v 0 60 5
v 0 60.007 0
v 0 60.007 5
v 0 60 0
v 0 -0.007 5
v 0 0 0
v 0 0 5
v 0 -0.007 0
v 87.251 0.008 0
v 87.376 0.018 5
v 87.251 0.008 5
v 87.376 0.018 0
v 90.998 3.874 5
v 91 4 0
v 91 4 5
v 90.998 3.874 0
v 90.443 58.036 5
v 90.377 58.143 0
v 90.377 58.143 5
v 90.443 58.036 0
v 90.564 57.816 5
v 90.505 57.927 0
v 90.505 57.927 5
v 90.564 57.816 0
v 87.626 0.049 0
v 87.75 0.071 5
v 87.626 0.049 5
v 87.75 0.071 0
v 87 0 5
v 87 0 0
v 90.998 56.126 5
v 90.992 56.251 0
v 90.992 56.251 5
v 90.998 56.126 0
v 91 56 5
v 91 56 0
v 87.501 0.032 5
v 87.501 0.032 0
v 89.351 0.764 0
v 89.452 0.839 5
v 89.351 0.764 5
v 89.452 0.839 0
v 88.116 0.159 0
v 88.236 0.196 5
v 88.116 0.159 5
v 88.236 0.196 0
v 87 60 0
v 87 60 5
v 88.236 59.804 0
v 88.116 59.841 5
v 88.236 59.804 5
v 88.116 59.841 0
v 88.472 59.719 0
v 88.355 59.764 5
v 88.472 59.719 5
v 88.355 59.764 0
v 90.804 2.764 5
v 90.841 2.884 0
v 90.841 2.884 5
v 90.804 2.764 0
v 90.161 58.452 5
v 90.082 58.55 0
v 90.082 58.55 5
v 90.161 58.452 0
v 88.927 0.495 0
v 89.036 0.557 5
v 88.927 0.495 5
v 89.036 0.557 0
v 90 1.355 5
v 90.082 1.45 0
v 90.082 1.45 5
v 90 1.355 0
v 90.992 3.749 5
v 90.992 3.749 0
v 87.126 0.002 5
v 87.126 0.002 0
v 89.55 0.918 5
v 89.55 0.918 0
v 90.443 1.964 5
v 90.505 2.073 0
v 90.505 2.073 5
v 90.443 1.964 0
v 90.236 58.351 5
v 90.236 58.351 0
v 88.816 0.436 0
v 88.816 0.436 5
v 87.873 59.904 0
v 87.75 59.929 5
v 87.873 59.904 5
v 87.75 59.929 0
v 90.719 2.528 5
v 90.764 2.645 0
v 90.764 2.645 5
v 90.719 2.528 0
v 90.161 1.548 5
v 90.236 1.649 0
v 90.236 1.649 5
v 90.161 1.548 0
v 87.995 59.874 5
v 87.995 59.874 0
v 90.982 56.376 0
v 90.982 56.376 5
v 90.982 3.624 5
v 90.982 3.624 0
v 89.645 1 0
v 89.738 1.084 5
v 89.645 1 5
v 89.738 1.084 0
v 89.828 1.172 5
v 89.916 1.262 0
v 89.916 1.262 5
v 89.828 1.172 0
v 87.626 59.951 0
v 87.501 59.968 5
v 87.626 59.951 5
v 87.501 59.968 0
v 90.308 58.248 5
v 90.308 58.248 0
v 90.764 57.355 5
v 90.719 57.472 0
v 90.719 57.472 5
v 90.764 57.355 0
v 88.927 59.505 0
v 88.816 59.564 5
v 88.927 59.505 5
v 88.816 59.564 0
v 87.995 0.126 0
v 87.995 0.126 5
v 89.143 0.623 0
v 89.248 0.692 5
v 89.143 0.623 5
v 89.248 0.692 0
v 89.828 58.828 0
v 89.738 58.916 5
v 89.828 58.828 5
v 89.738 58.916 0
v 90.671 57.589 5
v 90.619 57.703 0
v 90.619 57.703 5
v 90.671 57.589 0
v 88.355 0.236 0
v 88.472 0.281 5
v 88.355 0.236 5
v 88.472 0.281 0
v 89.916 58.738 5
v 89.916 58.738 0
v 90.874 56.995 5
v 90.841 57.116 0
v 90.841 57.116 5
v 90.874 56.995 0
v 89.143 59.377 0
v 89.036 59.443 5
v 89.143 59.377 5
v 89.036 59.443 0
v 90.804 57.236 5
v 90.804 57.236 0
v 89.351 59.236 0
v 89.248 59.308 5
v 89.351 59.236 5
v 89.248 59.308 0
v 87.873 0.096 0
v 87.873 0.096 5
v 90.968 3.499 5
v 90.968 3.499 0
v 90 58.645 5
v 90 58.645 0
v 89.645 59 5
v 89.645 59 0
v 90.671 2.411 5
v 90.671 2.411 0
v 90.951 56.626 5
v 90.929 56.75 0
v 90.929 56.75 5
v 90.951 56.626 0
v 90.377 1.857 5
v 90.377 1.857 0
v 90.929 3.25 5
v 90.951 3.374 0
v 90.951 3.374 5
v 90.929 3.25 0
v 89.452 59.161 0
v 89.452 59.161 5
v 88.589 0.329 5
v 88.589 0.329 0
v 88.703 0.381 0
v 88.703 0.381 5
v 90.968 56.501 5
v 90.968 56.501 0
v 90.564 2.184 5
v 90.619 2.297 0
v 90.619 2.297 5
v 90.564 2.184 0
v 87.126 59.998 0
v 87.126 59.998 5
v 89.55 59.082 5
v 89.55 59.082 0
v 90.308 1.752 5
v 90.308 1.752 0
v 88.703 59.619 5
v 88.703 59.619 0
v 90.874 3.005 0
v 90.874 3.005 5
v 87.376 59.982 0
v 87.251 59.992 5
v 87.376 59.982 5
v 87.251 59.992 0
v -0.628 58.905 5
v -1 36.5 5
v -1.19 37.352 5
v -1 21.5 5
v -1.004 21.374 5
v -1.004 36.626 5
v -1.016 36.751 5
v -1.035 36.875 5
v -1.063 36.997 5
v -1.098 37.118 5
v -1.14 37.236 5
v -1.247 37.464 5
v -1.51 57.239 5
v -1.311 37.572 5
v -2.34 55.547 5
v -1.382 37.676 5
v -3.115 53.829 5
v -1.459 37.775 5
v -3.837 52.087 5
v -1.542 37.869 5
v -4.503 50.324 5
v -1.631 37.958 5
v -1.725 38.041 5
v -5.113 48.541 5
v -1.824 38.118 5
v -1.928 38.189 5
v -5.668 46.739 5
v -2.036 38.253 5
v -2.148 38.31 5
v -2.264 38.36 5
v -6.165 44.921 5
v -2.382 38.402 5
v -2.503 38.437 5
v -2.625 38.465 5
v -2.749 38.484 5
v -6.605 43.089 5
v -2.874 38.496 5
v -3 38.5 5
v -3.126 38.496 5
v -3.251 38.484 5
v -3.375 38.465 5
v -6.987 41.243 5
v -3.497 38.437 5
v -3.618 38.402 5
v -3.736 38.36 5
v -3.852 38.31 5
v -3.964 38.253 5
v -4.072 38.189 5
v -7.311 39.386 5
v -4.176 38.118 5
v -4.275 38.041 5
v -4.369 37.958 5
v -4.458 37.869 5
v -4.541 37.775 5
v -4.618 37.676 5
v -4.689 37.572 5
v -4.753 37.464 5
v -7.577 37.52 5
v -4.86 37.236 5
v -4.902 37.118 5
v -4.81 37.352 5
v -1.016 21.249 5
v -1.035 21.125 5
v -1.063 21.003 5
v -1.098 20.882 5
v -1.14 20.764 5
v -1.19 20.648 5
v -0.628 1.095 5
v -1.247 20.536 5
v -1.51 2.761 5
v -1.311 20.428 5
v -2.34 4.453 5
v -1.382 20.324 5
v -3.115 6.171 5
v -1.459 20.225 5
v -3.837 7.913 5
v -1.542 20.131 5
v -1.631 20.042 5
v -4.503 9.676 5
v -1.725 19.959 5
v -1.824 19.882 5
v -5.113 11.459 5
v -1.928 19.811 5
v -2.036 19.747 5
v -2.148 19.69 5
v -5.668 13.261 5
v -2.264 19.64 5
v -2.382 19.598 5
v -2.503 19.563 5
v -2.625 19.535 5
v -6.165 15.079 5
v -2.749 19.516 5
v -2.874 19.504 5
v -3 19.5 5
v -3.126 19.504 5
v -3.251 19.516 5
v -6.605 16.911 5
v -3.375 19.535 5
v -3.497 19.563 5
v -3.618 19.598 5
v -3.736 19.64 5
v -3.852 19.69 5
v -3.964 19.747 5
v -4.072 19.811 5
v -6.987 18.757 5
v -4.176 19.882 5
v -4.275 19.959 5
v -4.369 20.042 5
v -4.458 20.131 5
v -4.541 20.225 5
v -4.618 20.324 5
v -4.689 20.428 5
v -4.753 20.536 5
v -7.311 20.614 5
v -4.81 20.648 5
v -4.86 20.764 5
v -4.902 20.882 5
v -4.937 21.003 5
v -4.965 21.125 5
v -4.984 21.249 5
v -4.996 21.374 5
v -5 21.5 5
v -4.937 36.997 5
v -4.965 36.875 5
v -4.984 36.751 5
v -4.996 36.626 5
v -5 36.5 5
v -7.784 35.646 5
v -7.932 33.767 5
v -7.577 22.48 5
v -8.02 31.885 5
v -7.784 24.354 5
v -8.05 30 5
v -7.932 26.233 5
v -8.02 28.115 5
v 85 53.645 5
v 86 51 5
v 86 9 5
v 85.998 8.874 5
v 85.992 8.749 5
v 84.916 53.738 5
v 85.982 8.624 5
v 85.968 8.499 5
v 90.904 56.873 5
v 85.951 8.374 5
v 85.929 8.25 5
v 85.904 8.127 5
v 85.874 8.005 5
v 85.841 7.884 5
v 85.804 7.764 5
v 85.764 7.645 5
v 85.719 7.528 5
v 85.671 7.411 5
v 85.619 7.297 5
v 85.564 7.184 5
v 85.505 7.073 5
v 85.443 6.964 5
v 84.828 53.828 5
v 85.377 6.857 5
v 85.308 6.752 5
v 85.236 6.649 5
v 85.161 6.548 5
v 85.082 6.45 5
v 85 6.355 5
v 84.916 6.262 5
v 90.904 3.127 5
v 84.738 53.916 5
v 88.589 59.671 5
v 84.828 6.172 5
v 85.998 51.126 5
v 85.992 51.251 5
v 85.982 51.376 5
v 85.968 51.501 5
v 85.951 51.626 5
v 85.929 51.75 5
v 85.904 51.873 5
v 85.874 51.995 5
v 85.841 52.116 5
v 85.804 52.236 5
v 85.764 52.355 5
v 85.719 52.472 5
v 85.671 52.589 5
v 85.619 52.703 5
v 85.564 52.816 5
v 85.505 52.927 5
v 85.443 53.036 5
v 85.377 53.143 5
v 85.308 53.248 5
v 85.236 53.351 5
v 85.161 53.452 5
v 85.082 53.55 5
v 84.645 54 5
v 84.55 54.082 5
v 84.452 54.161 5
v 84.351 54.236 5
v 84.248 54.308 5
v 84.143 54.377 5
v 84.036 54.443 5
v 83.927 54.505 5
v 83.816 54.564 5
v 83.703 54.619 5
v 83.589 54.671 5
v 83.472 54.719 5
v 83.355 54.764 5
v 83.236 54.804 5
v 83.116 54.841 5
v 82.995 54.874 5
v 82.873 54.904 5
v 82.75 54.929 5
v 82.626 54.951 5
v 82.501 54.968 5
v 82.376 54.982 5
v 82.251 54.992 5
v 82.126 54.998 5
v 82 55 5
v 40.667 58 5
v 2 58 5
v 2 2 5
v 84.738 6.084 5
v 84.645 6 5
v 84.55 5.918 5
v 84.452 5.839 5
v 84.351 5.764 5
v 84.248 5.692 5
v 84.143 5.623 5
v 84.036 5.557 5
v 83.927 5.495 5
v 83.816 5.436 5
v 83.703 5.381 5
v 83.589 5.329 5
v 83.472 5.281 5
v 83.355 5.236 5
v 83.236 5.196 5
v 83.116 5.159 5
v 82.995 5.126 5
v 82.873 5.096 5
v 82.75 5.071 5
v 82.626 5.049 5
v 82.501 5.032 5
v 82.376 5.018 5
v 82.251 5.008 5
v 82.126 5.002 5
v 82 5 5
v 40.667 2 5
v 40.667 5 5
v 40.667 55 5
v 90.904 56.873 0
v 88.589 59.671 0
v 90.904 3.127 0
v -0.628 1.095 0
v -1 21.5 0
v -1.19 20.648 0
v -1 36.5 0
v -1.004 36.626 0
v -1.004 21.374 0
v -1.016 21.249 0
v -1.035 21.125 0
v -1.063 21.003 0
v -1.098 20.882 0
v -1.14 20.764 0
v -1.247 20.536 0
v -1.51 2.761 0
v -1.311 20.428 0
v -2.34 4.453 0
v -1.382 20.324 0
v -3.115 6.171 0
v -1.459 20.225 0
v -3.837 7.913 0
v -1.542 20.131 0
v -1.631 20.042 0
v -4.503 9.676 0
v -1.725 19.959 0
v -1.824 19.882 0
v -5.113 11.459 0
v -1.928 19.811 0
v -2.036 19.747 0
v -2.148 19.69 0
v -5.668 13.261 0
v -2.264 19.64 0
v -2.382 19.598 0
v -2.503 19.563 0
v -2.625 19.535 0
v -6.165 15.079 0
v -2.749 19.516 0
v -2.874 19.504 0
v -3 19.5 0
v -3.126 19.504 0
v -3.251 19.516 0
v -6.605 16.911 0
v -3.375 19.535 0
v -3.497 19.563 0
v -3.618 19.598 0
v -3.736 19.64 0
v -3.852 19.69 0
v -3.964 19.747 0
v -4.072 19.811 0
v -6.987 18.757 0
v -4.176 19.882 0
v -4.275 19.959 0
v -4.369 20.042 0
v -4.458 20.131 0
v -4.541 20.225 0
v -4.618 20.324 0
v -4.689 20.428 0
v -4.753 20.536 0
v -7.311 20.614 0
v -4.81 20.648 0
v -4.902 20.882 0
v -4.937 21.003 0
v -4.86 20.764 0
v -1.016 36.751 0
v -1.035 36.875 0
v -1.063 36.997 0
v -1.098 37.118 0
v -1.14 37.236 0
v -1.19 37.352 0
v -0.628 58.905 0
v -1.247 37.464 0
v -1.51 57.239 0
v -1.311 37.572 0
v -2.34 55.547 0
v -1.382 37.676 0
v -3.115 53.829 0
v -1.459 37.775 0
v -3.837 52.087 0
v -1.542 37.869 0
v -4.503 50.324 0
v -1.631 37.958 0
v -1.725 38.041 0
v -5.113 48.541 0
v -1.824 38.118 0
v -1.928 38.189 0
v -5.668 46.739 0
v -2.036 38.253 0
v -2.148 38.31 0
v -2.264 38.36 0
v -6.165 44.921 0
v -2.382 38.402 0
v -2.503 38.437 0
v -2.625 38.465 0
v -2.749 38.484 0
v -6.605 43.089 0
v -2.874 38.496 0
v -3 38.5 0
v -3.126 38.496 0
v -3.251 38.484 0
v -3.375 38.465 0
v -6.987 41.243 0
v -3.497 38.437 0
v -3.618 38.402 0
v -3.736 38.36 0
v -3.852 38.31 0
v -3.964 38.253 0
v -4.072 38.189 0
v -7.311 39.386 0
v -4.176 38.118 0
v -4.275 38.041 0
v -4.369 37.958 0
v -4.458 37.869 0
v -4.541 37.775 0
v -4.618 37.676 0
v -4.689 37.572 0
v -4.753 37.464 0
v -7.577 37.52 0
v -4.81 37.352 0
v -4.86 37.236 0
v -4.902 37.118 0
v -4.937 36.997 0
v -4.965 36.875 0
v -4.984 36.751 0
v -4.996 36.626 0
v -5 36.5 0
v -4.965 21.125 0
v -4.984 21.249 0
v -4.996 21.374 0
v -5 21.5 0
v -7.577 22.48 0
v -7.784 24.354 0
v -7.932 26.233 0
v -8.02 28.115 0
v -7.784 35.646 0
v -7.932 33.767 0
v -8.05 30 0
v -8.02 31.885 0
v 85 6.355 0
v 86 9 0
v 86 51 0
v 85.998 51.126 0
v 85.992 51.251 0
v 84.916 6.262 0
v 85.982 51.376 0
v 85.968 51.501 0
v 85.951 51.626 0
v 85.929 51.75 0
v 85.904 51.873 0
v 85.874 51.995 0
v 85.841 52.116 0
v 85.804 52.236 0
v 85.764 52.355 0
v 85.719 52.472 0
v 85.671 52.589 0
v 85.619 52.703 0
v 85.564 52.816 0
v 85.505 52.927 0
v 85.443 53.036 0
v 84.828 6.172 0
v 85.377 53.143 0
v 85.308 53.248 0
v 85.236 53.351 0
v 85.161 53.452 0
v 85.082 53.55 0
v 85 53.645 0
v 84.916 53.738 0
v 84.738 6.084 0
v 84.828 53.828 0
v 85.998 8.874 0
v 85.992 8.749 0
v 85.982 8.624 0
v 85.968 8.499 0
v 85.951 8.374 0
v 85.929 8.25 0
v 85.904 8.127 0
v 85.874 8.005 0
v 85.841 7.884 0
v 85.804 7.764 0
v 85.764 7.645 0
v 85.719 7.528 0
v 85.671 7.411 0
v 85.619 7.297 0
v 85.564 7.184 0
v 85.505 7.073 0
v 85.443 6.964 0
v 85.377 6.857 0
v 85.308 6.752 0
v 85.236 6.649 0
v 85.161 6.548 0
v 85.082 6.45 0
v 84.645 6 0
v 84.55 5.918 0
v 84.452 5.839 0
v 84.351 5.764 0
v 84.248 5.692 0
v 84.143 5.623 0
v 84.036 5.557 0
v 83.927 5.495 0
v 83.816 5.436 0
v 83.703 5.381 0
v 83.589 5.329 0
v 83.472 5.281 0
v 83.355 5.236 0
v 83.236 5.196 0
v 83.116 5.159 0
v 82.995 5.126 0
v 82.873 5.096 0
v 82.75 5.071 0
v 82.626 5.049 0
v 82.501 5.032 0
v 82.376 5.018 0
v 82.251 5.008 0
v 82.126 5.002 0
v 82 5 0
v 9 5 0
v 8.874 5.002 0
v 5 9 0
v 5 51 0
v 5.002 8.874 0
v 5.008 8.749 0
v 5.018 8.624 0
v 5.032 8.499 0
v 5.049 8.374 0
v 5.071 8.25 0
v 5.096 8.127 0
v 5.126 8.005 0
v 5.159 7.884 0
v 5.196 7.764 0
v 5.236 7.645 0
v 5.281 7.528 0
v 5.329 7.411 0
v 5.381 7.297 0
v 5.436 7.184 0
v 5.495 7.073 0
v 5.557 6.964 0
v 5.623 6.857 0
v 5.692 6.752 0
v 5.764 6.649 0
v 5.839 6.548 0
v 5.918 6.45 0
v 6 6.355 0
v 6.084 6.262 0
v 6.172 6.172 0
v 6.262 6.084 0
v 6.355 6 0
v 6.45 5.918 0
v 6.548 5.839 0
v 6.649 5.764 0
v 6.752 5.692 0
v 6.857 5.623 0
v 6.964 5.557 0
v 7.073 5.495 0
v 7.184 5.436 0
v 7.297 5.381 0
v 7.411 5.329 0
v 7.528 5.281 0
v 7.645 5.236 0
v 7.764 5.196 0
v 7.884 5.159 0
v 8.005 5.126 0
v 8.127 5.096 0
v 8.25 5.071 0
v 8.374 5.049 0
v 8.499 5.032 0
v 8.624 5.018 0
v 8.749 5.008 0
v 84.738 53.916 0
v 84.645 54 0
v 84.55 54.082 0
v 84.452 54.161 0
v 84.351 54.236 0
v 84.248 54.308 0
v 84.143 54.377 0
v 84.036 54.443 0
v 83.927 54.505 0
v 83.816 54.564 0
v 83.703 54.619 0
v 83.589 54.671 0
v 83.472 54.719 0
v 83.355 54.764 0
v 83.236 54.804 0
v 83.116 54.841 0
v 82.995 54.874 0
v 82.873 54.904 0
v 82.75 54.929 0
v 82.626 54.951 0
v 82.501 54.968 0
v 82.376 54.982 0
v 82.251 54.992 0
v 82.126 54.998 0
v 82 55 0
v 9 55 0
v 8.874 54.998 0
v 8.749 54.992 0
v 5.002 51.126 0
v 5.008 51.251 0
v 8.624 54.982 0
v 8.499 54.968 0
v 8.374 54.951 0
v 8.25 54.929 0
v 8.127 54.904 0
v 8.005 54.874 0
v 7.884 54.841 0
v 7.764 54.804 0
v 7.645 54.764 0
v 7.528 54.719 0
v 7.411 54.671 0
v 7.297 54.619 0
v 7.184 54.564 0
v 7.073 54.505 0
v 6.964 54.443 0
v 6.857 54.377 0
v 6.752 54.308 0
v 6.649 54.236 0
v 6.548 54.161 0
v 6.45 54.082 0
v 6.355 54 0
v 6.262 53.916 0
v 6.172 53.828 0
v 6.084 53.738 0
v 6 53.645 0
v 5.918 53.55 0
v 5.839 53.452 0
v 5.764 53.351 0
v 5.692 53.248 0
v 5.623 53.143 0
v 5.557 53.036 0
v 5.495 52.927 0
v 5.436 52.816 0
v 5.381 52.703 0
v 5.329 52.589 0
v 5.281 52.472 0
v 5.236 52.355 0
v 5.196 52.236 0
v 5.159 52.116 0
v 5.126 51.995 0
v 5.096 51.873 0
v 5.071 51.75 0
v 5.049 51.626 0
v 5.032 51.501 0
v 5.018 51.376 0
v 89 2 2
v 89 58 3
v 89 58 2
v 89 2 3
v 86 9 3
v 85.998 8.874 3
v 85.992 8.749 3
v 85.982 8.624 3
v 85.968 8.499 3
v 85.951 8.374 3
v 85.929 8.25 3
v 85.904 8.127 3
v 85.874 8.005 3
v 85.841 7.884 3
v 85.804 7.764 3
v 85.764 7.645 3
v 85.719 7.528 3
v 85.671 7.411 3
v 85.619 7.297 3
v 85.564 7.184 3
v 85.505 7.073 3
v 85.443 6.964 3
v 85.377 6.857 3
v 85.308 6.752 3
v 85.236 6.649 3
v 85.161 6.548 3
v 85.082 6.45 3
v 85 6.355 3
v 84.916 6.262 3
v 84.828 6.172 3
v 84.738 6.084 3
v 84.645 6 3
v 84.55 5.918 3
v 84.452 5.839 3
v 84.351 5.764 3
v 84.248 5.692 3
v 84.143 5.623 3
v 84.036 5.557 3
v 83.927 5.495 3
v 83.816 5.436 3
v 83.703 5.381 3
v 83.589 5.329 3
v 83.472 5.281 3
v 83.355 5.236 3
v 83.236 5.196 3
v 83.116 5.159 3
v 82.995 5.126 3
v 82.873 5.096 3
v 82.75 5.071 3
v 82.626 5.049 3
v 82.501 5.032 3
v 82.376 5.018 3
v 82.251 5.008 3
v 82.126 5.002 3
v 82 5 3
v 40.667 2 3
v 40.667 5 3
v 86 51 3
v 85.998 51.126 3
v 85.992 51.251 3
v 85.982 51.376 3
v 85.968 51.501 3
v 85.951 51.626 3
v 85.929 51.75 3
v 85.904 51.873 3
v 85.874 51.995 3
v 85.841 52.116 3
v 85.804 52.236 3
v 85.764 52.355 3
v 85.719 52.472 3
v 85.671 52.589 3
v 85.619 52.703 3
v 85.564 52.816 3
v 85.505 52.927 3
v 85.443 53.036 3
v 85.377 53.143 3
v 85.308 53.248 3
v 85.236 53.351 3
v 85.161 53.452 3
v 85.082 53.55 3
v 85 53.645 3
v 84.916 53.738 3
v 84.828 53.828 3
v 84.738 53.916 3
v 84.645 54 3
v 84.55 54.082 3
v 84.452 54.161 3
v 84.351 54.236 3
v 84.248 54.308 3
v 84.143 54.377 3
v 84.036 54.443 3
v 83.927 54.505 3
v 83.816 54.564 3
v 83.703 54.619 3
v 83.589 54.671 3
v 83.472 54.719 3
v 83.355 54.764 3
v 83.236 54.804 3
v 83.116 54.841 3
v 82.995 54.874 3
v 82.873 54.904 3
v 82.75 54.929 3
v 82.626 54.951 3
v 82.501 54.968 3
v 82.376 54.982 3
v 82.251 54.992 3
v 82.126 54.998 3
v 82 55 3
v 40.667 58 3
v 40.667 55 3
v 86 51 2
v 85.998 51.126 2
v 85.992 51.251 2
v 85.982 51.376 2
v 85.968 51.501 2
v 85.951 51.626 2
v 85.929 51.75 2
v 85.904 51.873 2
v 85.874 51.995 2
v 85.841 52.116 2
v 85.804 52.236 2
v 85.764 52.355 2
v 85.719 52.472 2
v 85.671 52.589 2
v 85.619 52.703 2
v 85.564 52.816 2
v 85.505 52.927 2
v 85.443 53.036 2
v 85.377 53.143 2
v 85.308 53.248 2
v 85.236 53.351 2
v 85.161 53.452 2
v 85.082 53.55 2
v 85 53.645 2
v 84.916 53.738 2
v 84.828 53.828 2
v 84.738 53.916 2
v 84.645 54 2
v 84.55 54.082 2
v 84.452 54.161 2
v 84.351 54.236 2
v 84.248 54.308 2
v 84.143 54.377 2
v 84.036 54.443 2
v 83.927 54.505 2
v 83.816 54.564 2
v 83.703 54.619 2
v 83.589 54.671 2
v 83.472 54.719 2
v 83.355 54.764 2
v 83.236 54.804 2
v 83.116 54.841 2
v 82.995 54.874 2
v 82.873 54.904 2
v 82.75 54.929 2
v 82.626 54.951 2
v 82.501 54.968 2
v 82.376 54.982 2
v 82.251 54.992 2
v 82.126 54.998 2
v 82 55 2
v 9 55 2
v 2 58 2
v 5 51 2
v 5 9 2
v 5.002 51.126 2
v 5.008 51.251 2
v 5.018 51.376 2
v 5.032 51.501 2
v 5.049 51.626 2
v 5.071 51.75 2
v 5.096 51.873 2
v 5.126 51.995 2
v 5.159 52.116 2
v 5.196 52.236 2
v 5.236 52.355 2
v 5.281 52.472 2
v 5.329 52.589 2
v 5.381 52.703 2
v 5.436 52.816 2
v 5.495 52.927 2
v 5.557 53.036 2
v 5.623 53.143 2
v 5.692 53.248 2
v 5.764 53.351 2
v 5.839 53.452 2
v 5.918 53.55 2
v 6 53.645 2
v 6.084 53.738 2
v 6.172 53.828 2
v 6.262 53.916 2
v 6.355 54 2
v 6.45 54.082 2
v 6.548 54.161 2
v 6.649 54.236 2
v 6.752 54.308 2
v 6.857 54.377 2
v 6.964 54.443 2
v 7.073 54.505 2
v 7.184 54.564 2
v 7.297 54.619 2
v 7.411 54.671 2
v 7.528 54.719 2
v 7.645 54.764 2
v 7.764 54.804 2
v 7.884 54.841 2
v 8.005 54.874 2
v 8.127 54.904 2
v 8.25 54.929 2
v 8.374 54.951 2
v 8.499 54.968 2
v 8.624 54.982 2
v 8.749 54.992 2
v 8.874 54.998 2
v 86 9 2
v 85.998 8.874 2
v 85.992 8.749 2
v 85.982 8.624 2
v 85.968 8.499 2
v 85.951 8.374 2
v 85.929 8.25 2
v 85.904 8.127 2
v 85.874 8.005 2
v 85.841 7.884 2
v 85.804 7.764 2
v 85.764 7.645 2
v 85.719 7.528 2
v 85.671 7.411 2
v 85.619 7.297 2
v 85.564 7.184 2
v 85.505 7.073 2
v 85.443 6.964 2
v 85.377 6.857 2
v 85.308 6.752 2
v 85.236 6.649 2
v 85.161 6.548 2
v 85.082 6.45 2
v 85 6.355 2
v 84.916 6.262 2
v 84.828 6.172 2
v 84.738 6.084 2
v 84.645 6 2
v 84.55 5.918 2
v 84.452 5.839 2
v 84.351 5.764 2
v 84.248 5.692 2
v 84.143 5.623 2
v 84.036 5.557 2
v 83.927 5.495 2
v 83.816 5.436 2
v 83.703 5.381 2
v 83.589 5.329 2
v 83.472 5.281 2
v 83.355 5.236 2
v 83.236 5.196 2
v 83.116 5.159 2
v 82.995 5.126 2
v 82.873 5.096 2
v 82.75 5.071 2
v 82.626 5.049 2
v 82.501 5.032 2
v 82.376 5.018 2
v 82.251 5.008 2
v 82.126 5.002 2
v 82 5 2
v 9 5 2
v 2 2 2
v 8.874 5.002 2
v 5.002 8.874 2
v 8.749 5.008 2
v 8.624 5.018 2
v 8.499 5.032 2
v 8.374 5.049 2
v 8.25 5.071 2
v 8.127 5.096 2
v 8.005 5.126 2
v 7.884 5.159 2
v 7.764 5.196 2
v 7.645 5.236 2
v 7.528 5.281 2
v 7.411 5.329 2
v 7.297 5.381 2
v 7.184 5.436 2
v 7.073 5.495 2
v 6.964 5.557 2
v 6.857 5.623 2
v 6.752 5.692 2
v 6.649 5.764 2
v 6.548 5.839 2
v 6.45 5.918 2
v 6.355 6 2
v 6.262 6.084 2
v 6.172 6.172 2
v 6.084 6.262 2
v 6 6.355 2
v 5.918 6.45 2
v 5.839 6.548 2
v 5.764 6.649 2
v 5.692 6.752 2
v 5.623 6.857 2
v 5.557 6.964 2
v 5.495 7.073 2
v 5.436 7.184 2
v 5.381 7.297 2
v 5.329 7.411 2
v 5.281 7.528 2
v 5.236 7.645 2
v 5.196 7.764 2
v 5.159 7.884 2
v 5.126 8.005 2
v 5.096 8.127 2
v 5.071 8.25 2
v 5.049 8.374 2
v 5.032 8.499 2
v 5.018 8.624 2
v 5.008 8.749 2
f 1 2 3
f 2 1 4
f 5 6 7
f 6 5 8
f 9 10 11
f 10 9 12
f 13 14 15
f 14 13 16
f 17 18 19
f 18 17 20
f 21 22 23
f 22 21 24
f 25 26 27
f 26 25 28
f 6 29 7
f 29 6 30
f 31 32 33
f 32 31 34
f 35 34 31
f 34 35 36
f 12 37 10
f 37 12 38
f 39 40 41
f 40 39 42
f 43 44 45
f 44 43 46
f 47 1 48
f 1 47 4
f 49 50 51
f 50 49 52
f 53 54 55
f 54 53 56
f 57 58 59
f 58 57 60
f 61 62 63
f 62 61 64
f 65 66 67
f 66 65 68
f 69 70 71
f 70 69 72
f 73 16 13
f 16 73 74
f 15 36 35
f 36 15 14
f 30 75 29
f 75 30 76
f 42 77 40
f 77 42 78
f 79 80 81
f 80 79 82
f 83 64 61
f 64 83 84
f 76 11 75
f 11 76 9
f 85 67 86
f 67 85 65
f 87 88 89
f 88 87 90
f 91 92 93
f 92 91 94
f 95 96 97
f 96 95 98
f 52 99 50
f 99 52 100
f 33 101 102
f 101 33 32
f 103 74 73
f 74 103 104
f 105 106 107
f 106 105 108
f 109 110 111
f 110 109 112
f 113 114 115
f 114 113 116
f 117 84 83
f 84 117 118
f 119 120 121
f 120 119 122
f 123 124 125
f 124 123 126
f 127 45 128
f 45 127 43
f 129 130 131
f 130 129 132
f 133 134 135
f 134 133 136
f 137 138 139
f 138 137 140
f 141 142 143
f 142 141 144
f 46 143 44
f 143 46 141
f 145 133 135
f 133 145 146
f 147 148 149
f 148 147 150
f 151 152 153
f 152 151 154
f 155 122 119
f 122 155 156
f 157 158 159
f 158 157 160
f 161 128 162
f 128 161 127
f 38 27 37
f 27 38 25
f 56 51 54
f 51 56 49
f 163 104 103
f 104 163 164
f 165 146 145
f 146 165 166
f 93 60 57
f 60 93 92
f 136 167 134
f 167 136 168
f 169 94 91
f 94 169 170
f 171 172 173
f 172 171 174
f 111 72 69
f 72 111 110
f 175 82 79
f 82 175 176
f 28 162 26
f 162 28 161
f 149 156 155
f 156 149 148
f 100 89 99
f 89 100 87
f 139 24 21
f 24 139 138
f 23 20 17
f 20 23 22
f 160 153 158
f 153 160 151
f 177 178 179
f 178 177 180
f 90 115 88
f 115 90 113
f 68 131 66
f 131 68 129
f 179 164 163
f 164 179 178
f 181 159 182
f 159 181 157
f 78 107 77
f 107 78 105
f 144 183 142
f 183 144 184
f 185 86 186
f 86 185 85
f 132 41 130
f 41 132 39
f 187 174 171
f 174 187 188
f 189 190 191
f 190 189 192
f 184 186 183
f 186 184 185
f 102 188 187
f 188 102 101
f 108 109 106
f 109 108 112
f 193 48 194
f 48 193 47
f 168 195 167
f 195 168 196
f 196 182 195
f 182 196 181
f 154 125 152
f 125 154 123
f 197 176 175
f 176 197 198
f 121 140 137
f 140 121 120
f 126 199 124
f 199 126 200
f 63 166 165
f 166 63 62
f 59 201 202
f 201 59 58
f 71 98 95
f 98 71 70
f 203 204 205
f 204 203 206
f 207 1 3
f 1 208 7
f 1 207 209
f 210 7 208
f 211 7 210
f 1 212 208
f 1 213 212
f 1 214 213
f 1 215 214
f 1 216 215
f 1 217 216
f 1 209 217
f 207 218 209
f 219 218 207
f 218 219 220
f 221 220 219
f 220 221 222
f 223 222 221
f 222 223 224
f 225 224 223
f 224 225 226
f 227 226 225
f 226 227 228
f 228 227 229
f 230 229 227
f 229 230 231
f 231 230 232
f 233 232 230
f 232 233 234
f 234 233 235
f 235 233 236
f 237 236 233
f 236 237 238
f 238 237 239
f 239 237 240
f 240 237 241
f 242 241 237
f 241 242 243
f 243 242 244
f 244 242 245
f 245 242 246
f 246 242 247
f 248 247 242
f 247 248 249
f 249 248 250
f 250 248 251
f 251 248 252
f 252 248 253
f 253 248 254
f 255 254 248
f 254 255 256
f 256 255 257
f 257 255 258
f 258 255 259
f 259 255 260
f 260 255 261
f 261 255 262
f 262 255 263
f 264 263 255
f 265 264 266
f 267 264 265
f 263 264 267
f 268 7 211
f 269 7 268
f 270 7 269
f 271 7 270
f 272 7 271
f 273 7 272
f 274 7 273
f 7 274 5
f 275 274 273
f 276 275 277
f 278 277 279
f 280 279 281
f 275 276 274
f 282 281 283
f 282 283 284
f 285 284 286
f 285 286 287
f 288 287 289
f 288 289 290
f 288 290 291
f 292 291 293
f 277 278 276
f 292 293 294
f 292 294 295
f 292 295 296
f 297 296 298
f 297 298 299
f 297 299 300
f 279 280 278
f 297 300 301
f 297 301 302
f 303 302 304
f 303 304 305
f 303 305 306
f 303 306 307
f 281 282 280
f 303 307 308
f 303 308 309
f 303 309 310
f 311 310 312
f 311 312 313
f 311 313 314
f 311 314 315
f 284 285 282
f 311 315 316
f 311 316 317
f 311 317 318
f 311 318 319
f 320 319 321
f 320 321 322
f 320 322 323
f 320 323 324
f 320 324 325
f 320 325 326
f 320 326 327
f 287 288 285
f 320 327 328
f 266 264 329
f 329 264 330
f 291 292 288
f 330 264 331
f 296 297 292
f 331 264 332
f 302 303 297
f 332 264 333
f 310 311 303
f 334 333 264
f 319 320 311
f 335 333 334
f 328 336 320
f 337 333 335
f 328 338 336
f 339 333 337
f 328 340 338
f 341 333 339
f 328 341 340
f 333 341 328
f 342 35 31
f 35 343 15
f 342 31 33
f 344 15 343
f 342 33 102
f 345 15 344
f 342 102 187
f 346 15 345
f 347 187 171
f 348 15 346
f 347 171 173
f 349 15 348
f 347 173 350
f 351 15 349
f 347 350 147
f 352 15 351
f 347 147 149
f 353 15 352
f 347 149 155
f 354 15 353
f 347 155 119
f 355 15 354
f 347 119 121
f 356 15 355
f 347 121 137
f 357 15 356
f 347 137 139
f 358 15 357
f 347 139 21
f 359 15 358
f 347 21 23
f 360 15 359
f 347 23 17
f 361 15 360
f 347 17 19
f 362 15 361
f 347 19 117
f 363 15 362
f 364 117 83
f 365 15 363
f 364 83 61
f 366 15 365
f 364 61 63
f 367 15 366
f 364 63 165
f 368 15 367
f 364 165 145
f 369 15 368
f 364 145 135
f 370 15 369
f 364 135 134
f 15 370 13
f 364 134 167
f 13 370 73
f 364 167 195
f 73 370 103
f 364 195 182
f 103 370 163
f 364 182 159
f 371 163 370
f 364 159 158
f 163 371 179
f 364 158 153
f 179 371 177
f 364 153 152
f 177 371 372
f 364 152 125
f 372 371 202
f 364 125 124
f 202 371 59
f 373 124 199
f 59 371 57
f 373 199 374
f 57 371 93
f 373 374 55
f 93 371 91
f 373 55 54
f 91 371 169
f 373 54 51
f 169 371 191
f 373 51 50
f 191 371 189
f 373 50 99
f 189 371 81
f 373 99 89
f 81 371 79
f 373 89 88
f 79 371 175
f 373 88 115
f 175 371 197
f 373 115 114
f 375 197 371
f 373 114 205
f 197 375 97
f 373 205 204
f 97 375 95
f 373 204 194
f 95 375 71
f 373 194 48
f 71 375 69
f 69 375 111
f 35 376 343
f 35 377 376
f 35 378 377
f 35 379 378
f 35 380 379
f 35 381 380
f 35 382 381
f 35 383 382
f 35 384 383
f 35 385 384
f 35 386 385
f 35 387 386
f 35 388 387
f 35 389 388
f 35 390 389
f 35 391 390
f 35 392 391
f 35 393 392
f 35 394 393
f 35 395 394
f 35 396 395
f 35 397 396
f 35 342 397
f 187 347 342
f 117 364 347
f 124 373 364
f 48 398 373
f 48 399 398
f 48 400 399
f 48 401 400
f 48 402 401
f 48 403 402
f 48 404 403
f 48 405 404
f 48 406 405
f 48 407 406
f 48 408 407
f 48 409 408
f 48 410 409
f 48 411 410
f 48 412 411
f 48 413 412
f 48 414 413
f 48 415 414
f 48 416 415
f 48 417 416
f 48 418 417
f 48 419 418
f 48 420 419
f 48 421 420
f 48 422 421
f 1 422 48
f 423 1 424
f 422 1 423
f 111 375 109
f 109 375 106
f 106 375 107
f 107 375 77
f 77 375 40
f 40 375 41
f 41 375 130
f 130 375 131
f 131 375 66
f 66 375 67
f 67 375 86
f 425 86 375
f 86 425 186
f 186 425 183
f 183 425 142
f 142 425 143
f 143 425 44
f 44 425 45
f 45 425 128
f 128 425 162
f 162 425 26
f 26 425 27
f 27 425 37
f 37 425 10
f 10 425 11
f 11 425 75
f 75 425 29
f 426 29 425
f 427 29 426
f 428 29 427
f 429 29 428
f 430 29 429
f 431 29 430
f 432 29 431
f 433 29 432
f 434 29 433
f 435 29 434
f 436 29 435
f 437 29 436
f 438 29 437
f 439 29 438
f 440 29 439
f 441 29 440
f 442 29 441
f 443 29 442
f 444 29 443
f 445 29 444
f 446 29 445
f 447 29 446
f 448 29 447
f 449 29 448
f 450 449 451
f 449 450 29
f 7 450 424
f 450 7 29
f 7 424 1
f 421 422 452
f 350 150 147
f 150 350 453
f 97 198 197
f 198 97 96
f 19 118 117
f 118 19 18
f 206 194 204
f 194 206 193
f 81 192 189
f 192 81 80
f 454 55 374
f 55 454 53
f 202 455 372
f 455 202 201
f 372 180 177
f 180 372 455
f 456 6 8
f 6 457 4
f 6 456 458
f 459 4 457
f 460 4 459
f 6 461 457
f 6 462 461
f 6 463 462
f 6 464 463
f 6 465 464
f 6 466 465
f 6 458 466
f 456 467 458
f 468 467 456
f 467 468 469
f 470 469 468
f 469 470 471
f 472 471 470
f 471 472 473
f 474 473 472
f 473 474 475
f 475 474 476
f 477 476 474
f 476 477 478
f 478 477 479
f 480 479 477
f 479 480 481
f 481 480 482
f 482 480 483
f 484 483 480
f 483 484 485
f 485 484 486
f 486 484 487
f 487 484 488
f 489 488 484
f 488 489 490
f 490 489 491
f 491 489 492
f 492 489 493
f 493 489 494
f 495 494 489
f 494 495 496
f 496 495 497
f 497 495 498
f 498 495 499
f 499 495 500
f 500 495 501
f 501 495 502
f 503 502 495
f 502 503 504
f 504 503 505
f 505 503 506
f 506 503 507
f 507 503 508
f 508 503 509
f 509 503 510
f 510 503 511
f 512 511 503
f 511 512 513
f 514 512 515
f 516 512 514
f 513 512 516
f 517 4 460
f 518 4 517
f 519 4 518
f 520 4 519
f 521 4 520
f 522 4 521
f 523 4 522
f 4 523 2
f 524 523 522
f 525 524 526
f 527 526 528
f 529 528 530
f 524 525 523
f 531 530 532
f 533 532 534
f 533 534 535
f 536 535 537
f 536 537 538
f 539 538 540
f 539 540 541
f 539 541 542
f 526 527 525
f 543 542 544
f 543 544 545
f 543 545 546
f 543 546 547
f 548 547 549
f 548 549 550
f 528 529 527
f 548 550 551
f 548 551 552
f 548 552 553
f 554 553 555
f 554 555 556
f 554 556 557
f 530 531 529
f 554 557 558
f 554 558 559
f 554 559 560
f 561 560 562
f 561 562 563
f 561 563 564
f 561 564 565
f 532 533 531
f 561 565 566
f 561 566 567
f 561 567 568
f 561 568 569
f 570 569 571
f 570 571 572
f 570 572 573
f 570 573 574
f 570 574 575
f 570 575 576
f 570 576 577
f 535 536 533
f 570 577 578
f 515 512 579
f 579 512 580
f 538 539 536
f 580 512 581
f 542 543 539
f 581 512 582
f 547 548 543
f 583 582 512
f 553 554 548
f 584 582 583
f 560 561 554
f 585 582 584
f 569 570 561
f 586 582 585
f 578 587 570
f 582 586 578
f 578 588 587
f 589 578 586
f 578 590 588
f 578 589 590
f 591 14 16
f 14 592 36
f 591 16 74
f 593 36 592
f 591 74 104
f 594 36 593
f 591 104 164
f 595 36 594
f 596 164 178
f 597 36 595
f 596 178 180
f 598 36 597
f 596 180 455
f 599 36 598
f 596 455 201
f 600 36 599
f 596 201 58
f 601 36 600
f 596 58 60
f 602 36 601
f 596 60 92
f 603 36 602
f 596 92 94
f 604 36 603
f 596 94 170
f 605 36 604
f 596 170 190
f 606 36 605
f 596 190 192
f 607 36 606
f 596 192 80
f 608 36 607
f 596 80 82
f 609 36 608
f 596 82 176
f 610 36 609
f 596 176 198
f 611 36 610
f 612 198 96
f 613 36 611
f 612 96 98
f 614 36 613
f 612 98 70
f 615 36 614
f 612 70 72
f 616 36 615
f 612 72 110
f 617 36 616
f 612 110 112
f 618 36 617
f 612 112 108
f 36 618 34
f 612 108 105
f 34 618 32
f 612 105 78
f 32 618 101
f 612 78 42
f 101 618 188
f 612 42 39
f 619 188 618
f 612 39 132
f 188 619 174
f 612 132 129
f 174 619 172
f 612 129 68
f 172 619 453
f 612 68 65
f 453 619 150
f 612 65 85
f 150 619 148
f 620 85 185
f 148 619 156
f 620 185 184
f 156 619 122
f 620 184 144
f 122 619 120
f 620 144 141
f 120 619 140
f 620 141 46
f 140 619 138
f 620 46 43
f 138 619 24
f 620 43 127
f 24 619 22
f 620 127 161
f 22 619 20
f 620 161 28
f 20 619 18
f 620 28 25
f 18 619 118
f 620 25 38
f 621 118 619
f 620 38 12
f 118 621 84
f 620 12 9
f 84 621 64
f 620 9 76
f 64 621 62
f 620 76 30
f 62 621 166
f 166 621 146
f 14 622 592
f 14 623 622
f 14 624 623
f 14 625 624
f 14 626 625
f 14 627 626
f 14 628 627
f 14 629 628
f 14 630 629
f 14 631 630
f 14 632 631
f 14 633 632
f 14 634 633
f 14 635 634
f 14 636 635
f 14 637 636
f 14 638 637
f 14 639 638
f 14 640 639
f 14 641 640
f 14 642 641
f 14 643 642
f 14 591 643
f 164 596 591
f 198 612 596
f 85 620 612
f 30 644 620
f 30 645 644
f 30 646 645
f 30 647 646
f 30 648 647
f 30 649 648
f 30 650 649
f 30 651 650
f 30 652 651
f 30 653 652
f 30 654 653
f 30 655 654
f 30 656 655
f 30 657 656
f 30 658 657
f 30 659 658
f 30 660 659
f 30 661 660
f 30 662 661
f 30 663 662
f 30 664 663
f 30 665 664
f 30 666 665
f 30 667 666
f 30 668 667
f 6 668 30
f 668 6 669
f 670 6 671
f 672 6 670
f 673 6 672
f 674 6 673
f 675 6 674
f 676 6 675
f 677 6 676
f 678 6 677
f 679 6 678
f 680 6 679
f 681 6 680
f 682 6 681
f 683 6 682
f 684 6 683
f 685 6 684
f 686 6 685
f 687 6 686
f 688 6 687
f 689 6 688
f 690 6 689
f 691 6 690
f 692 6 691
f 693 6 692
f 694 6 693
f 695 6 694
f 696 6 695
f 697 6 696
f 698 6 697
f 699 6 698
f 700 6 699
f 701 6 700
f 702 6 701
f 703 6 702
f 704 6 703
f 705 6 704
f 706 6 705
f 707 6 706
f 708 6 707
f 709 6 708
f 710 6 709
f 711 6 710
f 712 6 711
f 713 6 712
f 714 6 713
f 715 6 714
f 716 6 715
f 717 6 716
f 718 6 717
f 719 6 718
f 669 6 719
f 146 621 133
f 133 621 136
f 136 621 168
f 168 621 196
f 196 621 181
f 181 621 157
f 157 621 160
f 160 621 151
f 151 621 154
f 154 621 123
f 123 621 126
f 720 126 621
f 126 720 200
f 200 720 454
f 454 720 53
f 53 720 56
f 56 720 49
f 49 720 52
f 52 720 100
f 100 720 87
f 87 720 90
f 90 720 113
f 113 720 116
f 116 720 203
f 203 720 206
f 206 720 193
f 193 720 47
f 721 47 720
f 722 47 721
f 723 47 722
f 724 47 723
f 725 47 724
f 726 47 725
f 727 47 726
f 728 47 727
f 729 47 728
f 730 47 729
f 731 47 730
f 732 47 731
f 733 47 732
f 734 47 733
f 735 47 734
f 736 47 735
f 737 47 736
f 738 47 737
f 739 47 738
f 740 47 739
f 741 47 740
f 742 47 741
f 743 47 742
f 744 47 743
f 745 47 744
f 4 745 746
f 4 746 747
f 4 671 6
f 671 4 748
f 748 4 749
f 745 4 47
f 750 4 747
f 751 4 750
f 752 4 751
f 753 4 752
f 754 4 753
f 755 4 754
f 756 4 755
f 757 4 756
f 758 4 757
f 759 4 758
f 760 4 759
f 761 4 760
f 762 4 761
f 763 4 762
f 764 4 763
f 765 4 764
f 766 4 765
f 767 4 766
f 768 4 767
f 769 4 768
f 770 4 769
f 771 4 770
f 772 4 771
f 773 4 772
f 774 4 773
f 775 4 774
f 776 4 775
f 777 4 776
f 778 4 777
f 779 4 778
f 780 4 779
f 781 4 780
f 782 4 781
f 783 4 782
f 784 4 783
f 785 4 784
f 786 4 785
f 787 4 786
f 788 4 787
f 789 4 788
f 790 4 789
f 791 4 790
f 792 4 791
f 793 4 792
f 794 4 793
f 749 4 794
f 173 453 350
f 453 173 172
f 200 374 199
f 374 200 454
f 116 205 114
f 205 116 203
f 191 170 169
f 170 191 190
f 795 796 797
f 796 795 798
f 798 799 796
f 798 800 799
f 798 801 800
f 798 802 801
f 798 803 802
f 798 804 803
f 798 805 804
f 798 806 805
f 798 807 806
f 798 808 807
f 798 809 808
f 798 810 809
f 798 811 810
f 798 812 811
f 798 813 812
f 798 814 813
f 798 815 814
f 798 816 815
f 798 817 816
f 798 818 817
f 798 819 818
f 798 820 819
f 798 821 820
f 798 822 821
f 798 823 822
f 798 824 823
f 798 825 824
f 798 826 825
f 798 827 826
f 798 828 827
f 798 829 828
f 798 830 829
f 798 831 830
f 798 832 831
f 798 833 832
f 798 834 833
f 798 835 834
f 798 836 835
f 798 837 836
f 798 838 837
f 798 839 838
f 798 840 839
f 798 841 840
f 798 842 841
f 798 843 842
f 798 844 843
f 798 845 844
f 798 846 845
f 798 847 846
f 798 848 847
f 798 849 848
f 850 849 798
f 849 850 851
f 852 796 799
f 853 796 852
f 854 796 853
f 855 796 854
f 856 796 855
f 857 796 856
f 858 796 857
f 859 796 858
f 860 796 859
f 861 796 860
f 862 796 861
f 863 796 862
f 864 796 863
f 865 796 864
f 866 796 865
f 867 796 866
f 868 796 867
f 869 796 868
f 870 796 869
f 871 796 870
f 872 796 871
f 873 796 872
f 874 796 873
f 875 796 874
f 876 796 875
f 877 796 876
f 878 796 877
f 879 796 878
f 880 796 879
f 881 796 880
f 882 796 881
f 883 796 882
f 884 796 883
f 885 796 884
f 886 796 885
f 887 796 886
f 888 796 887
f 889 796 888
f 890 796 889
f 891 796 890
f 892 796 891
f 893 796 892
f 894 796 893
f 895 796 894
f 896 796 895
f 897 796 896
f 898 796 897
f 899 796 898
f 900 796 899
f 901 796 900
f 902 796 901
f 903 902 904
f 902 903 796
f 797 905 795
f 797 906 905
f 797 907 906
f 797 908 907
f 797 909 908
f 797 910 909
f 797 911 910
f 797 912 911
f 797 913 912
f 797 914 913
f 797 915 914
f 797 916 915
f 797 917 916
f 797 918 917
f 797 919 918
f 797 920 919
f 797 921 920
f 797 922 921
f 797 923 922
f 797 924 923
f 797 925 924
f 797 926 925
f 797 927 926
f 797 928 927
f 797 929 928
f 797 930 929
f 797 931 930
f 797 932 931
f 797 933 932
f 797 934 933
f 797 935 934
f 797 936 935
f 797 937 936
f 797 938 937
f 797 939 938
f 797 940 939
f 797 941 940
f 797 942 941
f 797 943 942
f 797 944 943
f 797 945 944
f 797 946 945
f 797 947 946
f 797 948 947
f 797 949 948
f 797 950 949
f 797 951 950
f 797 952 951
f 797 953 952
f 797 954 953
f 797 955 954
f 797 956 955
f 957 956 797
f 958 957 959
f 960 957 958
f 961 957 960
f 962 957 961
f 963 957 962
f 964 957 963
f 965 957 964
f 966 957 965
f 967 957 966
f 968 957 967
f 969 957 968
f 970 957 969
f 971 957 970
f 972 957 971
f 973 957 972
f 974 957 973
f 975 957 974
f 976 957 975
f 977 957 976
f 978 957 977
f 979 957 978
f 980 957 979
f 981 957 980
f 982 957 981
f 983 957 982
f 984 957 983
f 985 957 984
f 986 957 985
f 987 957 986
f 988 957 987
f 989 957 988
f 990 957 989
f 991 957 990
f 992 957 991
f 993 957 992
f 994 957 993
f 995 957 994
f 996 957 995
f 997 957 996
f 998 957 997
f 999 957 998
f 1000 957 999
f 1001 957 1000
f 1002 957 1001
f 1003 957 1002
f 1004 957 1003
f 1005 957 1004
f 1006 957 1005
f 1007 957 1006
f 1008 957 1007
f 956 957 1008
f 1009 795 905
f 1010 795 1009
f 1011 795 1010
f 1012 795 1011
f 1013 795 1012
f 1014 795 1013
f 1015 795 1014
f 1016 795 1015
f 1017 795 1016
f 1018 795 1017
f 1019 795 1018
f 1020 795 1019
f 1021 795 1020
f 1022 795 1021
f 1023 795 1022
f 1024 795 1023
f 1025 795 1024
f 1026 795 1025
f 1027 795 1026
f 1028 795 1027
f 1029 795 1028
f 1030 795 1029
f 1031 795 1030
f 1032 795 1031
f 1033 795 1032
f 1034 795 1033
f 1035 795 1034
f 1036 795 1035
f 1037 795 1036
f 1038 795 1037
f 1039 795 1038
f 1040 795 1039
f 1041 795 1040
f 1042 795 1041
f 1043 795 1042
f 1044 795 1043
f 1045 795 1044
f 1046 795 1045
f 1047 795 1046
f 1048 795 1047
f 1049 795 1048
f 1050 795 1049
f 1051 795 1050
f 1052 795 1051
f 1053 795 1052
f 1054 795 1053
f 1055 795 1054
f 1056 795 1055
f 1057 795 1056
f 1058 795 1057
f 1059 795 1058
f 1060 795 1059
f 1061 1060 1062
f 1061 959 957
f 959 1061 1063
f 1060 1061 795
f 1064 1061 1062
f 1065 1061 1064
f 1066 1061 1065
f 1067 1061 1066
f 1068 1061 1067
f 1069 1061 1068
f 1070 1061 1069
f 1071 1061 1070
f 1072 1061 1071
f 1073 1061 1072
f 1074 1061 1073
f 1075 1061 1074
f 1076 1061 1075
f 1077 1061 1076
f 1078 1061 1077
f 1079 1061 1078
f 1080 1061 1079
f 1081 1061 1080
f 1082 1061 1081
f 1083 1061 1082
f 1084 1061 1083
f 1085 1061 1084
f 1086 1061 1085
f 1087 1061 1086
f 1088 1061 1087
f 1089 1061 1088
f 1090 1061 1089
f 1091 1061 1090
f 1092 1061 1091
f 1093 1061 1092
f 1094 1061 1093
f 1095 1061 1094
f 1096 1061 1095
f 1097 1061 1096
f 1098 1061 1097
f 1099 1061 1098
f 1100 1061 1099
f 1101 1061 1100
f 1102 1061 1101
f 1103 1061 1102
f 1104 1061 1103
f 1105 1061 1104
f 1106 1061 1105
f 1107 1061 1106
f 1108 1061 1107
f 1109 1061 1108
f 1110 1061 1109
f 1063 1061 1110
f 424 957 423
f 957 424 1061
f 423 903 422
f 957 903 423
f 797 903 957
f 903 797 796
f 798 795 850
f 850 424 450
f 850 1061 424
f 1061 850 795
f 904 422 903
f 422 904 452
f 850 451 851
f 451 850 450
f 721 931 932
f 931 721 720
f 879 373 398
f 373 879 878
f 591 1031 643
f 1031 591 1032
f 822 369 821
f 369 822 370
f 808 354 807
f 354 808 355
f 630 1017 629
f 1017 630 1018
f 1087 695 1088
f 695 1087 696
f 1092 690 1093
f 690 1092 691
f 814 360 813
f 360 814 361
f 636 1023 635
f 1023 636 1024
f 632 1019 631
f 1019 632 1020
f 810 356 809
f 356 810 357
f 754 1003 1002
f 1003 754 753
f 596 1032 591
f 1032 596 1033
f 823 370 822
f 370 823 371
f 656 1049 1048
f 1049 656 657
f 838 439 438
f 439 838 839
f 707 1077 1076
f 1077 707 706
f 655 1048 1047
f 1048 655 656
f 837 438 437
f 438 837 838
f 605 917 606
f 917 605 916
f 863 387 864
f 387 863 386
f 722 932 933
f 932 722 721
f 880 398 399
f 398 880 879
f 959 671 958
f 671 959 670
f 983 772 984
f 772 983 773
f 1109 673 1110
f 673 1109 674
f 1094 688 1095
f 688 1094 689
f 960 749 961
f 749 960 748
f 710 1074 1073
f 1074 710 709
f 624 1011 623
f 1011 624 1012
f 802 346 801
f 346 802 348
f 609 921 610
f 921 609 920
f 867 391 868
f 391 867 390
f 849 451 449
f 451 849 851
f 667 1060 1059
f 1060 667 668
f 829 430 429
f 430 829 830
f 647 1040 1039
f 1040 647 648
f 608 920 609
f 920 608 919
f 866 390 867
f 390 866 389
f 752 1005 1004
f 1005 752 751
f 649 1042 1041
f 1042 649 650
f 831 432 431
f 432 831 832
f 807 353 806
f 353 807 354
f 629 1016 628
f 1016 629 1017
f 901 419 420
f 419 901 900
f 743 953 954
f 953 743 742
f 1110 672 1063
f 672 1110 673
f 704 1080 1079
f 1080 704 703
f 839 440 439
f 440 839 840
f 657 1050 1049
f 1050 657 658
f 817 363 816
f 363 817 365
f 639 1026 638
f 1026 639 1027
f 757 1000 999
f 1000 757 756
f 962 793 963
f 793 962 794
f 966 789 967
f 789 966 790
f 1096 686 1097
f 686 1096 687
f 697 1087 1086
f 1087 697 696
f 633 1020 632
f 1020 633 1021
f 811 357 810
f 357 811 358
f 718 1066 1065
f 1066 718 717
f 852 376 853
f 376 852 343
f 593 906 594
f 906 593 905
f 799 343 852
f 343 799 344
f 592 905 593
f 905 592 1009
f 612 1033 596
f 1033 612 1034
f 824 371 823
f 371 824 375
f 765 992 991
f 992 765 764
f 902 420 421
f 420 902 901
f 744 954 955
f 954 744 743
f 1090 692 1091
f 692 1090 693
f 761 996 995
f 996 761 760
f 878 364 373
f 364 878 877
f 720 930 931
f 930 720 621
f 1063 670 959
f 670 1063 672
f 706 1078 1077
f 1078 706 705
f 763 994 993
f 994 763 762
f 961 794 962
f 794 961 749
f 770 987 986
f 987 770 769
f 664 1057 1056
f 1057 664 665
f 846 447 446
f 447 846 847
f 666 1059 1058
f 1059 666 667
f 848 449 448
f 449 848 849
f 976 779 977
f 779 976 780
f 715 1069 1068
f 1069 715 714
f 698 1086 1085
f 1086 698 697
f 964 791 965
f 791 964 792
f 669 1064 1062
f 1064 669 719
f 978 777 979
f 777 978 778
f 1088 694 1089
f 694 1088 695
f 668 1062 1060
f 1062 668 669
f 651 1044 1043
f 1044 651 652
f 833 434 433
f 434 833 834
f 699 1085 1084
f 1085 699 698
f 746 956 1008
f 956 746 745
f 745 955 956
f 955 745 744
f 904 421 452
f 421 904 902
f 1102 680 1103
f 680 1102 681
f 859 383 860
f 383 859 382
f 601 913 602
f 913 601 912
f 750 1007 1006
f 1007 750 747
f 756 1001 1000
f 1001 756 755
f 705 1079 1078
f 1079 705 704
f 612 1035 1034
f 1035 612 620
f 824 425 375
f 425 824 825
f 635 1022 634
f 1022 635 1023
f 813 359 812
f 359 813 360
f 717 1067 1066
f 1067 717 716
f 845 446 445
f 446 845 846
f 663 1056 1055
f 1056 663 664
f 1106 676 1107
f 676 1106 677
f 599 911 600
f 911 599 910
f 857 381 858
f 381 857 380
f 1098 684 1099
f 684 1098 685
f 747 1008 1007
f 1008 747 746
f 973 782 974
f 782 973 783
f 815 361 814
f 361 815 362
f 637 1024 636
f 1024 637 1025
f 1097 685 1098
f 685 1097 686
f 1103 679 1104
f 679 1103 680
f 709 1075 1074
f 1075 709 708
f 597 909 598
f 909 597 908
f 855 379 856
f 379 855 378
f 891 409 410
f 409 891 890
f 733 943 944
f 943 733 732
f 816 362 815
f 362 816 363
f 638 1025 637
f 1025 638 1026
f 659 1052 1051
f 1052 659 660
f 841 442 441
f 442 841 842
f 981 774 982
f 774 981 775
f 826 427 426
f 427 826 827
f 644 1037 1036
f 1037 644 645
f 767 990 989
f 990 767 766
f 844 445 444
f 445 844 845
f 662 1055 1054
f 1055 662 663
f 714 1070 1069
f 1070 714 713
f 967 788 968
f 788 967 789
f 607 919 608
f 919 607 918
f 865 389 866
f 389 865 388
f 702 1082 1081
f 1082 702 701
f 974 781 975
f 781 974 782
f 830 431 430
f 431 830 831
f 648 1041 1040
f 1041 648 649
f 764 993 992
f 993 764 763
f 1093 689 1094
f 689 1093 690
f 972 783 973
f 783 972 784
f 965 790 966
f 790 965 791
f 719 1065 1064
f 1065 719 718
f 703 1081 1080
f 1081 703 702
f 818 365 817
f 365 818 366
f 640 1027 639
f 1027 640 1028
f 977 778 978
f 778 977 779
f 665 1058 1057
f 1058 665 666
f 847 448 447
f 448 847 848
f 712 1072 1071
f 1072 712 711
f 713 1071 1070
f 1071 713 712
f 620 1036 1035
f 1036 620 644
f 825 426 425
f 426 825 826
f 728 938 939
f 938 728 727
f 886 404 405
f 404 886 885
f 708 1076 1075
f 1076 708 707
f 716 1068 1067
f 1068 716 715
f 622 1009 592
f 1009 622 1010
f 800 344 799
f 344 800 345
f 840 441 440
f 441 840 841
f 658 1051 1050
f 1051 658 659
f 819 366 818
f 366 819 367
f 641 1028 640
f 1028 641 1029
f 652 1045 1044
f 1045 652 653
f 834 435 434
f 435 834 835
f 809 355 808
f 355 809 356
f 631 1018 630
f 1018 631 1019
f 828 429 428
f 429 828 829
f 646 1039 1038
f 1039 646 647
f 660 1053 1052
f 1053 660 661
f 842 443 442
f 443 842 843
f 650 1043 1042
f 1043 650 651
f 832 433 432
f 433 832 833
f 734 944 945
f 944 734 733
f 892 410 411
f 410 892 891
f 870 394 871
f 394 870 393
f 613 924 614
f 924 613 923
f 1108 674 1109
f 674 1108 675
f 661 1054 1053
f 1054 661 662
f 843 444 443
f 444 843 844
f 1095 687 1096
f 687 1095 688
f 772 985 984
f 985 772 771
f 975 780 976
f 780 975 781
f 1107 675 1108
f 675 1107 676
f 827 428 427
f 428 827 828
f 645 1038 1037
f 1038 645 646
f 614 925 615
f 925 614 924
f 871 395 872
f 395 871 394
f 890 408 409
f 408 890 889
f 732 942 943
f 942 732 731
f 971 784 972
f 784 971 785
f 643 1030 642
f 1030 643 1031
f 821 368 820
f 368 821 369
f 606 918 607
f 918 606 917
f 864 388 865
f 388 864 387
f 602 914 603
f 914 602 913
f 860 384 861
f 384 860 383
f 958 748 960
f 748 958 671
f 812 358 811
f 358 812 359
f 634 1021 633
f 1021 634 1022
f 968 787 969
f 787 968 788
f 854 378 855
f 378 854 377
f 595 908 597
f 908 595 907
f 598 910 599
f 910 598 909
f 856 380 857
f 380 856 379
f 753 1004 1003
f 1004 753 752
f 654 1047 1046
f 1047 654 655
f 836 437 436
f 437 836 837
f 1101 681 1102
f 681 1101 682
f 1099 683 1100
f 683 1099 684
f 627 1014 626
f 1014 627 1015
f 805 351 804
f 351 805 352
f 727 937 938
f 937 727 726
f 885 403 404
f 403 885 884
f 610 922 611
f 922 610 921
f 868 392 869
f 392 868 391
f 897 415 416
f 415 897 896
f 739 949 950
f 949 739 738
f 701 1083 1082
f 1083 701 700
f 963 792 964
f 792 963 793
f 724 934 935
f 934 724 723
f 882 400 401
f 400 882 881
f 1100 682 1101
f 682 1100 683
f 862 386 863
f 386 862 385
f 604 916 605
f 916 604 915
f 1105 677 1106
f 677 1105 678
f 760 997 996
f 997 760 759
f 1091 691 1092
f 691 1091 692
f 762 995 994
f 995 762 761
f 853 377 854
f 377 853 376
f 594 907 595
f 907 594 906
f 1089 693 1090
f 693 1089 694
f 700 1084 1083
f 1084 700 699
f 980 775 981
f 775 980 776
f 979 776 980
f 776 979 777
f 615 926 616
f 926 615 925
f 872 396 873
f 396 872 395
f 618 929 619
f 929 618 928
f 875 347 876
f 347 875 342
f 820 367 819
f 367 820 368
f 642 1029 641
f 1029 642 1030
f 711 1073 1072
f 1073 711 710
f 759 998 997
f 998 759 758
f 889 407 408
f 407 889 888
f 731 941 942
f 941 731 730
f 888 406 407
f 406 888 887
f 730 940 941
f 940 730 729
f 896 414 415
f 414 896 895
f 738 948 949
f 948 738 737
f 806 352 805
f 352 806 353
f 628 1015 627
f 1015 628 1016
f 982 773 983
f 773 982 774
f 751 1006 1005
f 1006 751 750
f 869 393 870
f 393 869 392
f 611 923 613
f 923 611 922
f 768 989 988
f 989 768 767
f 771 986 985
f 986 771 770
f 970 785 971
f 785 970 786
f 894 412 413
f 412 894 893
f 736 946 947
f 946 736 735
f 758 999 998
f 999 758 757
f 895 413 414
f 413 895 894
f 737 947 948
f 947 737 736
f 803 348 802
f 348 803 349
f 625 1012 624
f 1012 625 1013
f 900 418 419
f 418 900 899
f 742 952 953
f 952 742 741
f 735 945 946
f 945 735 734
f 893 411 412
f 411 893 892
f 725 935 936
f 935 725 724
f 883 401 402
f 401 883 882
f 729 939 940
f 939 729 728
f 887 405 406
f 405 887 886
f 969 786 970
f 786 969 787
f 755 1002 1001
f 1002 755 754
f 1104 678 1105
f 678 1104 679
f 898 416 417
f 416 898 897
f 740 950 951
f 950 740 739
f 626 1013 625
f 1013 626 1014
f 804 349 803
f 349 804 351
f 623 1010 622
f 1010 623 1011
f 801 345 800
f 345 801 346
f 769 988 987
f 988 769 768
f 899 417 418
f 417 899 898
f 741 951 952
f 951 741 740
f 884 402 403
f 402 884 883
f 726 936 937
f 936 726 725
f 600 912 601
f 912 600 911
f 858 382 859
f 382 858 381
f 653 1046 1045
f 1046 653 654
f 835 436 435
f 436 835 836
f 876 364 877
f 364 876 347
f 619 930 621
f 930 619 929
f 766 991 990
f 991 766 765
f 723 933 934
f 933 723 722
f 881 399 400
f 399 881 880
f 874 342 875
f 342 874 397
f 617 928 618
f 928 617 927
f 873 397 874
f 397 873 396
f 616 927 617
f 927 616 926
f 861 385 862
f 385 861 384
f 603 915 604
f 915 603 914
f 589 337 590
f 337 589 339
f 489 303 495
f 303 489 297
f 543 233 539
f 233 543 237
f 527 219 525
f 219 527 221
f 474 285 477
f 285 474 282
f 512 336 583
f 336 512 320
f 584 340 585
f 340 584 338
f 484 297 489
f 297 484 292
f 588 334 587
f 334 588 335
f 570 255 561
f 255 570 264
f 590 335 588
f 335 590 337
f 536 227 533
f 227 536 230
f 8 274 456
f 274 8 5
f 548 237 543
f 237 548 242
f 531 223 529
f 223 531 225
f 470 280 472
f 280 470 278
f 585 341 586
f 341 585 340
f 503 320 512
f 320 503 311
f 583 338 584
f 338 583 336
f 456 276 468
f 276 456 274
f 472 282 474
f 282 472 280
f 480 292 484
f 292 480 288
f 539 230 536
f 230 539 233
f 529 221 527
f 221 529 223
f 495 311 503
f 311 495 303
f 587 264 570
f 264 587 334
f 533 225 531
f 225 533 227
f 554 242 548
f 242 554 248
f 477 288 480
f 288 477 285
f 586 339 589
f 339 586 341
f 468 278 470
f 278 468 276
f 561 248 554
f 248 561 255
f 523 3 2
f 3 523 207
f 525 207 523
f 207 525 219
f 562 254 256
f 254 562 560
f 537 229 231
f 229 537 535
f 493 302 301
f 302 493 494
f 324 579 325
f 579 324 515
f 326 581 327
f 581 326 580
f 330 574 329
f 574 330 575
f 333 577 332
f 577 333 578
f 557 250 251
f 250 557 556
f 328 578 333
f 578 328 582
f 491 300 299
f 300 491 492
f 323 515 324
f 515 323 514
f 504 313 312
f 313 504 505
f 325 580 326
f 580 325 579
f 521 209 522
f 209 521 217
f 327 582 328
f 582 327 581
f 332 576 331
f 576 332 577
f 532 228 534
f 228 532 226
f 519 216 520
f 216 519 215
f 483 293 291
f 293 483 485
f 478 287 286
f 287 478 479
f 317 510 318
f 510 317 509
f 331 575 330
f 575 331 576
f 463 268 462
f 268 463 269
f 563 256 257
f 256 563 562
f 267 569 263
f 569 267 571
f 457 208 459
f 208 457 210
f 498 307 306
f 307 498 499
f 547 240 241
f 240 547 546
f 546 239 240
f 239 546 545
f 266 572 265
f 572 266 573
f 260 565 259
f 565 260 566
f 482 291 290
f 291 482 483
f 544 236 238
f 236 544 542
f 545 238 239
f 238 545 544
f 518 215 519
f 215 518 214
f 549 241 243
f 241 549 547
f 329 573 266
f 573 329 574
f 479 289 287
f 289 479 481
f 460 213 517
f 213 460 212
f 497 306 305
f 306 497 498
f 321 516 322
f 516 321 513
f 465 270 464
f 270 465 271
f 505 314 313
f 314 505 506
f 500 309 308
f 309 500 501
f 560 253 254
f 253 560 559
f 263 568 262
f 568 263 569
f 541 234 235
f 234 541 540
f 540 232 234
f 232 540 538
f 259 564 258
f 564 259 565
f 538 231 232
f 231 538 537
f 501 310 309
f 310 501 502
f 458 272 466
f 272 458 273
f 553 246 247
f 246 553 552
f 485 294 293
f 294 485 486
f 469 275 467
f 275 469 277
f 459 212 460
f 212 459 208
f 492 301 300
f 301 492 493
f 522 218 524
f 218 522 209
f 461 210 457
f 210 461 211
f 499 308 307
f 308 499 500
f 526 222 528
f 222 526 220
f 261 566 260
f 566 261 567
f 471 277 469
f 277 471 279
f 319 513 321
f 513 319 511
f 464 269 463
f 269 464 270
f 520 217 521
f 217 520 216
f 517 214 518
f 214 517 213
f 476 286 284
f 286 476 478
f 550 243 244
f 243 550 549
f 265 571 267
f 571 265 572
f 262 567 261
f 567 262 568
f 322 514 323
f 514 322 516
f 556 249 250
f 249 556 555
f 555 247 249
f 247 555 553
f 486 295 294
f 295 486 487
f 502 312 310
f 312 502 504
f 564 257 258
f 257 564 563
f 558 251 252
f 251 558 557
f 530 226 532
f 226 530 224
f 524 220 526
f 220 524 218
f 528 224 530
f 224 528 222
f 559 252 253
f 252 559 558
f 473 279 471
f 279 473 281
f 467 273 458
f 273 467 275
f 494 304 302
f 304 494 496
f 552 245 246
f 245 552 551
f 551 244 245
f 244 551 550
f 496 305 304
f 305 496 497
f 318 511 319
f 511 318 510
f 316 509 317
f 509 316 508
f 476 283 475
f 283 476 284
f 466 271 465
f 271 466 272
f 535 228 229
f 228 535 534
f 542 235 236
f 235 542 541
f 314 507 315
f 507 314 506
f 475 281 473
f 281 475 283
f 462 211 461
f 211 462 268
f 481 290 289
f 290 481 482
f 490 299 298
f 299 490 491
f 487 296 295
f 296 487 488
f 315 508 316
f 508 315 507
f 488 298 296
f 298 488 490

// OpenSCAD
badge_thickness = 1;

/* [Hidden] */
badge_width = 56;
badge_height = 87;

holder_wall_size = 2;
holder_bezel_size = holder_wall_size + 3;

holder_height = badge_height + (holder_wall_size * 2);
holder_width = badge_width + (holder_wall_size * 2);
holder_thickness = badge_thickness  + (holder_wall_size * 2);
holder_radius = 4;

clip_hole_width = 15;
clip_hole_height = 4;

difference() {
  hull() {
    cube(size=[holder_height - holder_radius, holder_width, holder_thickness]);
    
    translate([holder_height - holder_radius, holder_radius, 0])
      cylinder(h=holder_thickness, r=holder_radius, $fn=200);
    translate([holder_height - holder_radius, holder_width - holder_radius, 0])
      cylinder(h=holder_thickness, r=holder_radius, $fn=200);
  }
  
  translate([holder_wall_size,holder_wall_size, holder_wall_size])
    cube(size=[badge_height, badge_width, badge_thickness]);
  
  translate([holder_wall_size,holder_wall_size, holder_wall_size])
    cube(size=[badge_height / 2.25, badge_width, holder_thickness * 2]);
  
  hull() {
    translate([holder_bezel_size + holder_radius, holder_bezel_size + holder_radius, 0])
      cylinder(h=holder_thickness, r=holder_radius, $fn=200);
    translate([holder_bezel_size + holder_radius, holder_width - holder_bezel_size - holder_radius, 0])
      cylinder(h=holder_thickness, r=holder_radius, $fn=200);
    translate([holder_height - holder_bezel_size - holder_radius, holder_bezel_size + holder_radius, 0])
      cylinder(h=holder_thickness, r=holder_radius, $fn=200);
    translate([holder_height - holder_bezel_size - holder_radius, holder_width - holder_bezel_size - holder_radius, 0])
      cylinder(h=holder_thickness, r=holder_radius, $fn=200);
  }
}

difference() {
  translate([holder_width - 8.05, holder_width / 2, 0])
    cylinder(h=holder_thickness, d=holder_width * 2, $fn=200);
  
  translate([0, holder_width * -1.5, -1])
    cube(holder_width * 3, holder_width * 3, 100);
  
  translate([(clip_hole_height / -2) - 1, (holder_width - (clip_hole_width + (clip_hole_height / 2))) / 2, -.5])
  hull() {
    translate([0,clip_hole_width,0])
      cylinder(h=holder_thickness + 1, d=clip_hole_height, $fn=100);
    cylinder(h=holder_thickness + 1, d=clip_hole_height, $fn=100);
  }
}
